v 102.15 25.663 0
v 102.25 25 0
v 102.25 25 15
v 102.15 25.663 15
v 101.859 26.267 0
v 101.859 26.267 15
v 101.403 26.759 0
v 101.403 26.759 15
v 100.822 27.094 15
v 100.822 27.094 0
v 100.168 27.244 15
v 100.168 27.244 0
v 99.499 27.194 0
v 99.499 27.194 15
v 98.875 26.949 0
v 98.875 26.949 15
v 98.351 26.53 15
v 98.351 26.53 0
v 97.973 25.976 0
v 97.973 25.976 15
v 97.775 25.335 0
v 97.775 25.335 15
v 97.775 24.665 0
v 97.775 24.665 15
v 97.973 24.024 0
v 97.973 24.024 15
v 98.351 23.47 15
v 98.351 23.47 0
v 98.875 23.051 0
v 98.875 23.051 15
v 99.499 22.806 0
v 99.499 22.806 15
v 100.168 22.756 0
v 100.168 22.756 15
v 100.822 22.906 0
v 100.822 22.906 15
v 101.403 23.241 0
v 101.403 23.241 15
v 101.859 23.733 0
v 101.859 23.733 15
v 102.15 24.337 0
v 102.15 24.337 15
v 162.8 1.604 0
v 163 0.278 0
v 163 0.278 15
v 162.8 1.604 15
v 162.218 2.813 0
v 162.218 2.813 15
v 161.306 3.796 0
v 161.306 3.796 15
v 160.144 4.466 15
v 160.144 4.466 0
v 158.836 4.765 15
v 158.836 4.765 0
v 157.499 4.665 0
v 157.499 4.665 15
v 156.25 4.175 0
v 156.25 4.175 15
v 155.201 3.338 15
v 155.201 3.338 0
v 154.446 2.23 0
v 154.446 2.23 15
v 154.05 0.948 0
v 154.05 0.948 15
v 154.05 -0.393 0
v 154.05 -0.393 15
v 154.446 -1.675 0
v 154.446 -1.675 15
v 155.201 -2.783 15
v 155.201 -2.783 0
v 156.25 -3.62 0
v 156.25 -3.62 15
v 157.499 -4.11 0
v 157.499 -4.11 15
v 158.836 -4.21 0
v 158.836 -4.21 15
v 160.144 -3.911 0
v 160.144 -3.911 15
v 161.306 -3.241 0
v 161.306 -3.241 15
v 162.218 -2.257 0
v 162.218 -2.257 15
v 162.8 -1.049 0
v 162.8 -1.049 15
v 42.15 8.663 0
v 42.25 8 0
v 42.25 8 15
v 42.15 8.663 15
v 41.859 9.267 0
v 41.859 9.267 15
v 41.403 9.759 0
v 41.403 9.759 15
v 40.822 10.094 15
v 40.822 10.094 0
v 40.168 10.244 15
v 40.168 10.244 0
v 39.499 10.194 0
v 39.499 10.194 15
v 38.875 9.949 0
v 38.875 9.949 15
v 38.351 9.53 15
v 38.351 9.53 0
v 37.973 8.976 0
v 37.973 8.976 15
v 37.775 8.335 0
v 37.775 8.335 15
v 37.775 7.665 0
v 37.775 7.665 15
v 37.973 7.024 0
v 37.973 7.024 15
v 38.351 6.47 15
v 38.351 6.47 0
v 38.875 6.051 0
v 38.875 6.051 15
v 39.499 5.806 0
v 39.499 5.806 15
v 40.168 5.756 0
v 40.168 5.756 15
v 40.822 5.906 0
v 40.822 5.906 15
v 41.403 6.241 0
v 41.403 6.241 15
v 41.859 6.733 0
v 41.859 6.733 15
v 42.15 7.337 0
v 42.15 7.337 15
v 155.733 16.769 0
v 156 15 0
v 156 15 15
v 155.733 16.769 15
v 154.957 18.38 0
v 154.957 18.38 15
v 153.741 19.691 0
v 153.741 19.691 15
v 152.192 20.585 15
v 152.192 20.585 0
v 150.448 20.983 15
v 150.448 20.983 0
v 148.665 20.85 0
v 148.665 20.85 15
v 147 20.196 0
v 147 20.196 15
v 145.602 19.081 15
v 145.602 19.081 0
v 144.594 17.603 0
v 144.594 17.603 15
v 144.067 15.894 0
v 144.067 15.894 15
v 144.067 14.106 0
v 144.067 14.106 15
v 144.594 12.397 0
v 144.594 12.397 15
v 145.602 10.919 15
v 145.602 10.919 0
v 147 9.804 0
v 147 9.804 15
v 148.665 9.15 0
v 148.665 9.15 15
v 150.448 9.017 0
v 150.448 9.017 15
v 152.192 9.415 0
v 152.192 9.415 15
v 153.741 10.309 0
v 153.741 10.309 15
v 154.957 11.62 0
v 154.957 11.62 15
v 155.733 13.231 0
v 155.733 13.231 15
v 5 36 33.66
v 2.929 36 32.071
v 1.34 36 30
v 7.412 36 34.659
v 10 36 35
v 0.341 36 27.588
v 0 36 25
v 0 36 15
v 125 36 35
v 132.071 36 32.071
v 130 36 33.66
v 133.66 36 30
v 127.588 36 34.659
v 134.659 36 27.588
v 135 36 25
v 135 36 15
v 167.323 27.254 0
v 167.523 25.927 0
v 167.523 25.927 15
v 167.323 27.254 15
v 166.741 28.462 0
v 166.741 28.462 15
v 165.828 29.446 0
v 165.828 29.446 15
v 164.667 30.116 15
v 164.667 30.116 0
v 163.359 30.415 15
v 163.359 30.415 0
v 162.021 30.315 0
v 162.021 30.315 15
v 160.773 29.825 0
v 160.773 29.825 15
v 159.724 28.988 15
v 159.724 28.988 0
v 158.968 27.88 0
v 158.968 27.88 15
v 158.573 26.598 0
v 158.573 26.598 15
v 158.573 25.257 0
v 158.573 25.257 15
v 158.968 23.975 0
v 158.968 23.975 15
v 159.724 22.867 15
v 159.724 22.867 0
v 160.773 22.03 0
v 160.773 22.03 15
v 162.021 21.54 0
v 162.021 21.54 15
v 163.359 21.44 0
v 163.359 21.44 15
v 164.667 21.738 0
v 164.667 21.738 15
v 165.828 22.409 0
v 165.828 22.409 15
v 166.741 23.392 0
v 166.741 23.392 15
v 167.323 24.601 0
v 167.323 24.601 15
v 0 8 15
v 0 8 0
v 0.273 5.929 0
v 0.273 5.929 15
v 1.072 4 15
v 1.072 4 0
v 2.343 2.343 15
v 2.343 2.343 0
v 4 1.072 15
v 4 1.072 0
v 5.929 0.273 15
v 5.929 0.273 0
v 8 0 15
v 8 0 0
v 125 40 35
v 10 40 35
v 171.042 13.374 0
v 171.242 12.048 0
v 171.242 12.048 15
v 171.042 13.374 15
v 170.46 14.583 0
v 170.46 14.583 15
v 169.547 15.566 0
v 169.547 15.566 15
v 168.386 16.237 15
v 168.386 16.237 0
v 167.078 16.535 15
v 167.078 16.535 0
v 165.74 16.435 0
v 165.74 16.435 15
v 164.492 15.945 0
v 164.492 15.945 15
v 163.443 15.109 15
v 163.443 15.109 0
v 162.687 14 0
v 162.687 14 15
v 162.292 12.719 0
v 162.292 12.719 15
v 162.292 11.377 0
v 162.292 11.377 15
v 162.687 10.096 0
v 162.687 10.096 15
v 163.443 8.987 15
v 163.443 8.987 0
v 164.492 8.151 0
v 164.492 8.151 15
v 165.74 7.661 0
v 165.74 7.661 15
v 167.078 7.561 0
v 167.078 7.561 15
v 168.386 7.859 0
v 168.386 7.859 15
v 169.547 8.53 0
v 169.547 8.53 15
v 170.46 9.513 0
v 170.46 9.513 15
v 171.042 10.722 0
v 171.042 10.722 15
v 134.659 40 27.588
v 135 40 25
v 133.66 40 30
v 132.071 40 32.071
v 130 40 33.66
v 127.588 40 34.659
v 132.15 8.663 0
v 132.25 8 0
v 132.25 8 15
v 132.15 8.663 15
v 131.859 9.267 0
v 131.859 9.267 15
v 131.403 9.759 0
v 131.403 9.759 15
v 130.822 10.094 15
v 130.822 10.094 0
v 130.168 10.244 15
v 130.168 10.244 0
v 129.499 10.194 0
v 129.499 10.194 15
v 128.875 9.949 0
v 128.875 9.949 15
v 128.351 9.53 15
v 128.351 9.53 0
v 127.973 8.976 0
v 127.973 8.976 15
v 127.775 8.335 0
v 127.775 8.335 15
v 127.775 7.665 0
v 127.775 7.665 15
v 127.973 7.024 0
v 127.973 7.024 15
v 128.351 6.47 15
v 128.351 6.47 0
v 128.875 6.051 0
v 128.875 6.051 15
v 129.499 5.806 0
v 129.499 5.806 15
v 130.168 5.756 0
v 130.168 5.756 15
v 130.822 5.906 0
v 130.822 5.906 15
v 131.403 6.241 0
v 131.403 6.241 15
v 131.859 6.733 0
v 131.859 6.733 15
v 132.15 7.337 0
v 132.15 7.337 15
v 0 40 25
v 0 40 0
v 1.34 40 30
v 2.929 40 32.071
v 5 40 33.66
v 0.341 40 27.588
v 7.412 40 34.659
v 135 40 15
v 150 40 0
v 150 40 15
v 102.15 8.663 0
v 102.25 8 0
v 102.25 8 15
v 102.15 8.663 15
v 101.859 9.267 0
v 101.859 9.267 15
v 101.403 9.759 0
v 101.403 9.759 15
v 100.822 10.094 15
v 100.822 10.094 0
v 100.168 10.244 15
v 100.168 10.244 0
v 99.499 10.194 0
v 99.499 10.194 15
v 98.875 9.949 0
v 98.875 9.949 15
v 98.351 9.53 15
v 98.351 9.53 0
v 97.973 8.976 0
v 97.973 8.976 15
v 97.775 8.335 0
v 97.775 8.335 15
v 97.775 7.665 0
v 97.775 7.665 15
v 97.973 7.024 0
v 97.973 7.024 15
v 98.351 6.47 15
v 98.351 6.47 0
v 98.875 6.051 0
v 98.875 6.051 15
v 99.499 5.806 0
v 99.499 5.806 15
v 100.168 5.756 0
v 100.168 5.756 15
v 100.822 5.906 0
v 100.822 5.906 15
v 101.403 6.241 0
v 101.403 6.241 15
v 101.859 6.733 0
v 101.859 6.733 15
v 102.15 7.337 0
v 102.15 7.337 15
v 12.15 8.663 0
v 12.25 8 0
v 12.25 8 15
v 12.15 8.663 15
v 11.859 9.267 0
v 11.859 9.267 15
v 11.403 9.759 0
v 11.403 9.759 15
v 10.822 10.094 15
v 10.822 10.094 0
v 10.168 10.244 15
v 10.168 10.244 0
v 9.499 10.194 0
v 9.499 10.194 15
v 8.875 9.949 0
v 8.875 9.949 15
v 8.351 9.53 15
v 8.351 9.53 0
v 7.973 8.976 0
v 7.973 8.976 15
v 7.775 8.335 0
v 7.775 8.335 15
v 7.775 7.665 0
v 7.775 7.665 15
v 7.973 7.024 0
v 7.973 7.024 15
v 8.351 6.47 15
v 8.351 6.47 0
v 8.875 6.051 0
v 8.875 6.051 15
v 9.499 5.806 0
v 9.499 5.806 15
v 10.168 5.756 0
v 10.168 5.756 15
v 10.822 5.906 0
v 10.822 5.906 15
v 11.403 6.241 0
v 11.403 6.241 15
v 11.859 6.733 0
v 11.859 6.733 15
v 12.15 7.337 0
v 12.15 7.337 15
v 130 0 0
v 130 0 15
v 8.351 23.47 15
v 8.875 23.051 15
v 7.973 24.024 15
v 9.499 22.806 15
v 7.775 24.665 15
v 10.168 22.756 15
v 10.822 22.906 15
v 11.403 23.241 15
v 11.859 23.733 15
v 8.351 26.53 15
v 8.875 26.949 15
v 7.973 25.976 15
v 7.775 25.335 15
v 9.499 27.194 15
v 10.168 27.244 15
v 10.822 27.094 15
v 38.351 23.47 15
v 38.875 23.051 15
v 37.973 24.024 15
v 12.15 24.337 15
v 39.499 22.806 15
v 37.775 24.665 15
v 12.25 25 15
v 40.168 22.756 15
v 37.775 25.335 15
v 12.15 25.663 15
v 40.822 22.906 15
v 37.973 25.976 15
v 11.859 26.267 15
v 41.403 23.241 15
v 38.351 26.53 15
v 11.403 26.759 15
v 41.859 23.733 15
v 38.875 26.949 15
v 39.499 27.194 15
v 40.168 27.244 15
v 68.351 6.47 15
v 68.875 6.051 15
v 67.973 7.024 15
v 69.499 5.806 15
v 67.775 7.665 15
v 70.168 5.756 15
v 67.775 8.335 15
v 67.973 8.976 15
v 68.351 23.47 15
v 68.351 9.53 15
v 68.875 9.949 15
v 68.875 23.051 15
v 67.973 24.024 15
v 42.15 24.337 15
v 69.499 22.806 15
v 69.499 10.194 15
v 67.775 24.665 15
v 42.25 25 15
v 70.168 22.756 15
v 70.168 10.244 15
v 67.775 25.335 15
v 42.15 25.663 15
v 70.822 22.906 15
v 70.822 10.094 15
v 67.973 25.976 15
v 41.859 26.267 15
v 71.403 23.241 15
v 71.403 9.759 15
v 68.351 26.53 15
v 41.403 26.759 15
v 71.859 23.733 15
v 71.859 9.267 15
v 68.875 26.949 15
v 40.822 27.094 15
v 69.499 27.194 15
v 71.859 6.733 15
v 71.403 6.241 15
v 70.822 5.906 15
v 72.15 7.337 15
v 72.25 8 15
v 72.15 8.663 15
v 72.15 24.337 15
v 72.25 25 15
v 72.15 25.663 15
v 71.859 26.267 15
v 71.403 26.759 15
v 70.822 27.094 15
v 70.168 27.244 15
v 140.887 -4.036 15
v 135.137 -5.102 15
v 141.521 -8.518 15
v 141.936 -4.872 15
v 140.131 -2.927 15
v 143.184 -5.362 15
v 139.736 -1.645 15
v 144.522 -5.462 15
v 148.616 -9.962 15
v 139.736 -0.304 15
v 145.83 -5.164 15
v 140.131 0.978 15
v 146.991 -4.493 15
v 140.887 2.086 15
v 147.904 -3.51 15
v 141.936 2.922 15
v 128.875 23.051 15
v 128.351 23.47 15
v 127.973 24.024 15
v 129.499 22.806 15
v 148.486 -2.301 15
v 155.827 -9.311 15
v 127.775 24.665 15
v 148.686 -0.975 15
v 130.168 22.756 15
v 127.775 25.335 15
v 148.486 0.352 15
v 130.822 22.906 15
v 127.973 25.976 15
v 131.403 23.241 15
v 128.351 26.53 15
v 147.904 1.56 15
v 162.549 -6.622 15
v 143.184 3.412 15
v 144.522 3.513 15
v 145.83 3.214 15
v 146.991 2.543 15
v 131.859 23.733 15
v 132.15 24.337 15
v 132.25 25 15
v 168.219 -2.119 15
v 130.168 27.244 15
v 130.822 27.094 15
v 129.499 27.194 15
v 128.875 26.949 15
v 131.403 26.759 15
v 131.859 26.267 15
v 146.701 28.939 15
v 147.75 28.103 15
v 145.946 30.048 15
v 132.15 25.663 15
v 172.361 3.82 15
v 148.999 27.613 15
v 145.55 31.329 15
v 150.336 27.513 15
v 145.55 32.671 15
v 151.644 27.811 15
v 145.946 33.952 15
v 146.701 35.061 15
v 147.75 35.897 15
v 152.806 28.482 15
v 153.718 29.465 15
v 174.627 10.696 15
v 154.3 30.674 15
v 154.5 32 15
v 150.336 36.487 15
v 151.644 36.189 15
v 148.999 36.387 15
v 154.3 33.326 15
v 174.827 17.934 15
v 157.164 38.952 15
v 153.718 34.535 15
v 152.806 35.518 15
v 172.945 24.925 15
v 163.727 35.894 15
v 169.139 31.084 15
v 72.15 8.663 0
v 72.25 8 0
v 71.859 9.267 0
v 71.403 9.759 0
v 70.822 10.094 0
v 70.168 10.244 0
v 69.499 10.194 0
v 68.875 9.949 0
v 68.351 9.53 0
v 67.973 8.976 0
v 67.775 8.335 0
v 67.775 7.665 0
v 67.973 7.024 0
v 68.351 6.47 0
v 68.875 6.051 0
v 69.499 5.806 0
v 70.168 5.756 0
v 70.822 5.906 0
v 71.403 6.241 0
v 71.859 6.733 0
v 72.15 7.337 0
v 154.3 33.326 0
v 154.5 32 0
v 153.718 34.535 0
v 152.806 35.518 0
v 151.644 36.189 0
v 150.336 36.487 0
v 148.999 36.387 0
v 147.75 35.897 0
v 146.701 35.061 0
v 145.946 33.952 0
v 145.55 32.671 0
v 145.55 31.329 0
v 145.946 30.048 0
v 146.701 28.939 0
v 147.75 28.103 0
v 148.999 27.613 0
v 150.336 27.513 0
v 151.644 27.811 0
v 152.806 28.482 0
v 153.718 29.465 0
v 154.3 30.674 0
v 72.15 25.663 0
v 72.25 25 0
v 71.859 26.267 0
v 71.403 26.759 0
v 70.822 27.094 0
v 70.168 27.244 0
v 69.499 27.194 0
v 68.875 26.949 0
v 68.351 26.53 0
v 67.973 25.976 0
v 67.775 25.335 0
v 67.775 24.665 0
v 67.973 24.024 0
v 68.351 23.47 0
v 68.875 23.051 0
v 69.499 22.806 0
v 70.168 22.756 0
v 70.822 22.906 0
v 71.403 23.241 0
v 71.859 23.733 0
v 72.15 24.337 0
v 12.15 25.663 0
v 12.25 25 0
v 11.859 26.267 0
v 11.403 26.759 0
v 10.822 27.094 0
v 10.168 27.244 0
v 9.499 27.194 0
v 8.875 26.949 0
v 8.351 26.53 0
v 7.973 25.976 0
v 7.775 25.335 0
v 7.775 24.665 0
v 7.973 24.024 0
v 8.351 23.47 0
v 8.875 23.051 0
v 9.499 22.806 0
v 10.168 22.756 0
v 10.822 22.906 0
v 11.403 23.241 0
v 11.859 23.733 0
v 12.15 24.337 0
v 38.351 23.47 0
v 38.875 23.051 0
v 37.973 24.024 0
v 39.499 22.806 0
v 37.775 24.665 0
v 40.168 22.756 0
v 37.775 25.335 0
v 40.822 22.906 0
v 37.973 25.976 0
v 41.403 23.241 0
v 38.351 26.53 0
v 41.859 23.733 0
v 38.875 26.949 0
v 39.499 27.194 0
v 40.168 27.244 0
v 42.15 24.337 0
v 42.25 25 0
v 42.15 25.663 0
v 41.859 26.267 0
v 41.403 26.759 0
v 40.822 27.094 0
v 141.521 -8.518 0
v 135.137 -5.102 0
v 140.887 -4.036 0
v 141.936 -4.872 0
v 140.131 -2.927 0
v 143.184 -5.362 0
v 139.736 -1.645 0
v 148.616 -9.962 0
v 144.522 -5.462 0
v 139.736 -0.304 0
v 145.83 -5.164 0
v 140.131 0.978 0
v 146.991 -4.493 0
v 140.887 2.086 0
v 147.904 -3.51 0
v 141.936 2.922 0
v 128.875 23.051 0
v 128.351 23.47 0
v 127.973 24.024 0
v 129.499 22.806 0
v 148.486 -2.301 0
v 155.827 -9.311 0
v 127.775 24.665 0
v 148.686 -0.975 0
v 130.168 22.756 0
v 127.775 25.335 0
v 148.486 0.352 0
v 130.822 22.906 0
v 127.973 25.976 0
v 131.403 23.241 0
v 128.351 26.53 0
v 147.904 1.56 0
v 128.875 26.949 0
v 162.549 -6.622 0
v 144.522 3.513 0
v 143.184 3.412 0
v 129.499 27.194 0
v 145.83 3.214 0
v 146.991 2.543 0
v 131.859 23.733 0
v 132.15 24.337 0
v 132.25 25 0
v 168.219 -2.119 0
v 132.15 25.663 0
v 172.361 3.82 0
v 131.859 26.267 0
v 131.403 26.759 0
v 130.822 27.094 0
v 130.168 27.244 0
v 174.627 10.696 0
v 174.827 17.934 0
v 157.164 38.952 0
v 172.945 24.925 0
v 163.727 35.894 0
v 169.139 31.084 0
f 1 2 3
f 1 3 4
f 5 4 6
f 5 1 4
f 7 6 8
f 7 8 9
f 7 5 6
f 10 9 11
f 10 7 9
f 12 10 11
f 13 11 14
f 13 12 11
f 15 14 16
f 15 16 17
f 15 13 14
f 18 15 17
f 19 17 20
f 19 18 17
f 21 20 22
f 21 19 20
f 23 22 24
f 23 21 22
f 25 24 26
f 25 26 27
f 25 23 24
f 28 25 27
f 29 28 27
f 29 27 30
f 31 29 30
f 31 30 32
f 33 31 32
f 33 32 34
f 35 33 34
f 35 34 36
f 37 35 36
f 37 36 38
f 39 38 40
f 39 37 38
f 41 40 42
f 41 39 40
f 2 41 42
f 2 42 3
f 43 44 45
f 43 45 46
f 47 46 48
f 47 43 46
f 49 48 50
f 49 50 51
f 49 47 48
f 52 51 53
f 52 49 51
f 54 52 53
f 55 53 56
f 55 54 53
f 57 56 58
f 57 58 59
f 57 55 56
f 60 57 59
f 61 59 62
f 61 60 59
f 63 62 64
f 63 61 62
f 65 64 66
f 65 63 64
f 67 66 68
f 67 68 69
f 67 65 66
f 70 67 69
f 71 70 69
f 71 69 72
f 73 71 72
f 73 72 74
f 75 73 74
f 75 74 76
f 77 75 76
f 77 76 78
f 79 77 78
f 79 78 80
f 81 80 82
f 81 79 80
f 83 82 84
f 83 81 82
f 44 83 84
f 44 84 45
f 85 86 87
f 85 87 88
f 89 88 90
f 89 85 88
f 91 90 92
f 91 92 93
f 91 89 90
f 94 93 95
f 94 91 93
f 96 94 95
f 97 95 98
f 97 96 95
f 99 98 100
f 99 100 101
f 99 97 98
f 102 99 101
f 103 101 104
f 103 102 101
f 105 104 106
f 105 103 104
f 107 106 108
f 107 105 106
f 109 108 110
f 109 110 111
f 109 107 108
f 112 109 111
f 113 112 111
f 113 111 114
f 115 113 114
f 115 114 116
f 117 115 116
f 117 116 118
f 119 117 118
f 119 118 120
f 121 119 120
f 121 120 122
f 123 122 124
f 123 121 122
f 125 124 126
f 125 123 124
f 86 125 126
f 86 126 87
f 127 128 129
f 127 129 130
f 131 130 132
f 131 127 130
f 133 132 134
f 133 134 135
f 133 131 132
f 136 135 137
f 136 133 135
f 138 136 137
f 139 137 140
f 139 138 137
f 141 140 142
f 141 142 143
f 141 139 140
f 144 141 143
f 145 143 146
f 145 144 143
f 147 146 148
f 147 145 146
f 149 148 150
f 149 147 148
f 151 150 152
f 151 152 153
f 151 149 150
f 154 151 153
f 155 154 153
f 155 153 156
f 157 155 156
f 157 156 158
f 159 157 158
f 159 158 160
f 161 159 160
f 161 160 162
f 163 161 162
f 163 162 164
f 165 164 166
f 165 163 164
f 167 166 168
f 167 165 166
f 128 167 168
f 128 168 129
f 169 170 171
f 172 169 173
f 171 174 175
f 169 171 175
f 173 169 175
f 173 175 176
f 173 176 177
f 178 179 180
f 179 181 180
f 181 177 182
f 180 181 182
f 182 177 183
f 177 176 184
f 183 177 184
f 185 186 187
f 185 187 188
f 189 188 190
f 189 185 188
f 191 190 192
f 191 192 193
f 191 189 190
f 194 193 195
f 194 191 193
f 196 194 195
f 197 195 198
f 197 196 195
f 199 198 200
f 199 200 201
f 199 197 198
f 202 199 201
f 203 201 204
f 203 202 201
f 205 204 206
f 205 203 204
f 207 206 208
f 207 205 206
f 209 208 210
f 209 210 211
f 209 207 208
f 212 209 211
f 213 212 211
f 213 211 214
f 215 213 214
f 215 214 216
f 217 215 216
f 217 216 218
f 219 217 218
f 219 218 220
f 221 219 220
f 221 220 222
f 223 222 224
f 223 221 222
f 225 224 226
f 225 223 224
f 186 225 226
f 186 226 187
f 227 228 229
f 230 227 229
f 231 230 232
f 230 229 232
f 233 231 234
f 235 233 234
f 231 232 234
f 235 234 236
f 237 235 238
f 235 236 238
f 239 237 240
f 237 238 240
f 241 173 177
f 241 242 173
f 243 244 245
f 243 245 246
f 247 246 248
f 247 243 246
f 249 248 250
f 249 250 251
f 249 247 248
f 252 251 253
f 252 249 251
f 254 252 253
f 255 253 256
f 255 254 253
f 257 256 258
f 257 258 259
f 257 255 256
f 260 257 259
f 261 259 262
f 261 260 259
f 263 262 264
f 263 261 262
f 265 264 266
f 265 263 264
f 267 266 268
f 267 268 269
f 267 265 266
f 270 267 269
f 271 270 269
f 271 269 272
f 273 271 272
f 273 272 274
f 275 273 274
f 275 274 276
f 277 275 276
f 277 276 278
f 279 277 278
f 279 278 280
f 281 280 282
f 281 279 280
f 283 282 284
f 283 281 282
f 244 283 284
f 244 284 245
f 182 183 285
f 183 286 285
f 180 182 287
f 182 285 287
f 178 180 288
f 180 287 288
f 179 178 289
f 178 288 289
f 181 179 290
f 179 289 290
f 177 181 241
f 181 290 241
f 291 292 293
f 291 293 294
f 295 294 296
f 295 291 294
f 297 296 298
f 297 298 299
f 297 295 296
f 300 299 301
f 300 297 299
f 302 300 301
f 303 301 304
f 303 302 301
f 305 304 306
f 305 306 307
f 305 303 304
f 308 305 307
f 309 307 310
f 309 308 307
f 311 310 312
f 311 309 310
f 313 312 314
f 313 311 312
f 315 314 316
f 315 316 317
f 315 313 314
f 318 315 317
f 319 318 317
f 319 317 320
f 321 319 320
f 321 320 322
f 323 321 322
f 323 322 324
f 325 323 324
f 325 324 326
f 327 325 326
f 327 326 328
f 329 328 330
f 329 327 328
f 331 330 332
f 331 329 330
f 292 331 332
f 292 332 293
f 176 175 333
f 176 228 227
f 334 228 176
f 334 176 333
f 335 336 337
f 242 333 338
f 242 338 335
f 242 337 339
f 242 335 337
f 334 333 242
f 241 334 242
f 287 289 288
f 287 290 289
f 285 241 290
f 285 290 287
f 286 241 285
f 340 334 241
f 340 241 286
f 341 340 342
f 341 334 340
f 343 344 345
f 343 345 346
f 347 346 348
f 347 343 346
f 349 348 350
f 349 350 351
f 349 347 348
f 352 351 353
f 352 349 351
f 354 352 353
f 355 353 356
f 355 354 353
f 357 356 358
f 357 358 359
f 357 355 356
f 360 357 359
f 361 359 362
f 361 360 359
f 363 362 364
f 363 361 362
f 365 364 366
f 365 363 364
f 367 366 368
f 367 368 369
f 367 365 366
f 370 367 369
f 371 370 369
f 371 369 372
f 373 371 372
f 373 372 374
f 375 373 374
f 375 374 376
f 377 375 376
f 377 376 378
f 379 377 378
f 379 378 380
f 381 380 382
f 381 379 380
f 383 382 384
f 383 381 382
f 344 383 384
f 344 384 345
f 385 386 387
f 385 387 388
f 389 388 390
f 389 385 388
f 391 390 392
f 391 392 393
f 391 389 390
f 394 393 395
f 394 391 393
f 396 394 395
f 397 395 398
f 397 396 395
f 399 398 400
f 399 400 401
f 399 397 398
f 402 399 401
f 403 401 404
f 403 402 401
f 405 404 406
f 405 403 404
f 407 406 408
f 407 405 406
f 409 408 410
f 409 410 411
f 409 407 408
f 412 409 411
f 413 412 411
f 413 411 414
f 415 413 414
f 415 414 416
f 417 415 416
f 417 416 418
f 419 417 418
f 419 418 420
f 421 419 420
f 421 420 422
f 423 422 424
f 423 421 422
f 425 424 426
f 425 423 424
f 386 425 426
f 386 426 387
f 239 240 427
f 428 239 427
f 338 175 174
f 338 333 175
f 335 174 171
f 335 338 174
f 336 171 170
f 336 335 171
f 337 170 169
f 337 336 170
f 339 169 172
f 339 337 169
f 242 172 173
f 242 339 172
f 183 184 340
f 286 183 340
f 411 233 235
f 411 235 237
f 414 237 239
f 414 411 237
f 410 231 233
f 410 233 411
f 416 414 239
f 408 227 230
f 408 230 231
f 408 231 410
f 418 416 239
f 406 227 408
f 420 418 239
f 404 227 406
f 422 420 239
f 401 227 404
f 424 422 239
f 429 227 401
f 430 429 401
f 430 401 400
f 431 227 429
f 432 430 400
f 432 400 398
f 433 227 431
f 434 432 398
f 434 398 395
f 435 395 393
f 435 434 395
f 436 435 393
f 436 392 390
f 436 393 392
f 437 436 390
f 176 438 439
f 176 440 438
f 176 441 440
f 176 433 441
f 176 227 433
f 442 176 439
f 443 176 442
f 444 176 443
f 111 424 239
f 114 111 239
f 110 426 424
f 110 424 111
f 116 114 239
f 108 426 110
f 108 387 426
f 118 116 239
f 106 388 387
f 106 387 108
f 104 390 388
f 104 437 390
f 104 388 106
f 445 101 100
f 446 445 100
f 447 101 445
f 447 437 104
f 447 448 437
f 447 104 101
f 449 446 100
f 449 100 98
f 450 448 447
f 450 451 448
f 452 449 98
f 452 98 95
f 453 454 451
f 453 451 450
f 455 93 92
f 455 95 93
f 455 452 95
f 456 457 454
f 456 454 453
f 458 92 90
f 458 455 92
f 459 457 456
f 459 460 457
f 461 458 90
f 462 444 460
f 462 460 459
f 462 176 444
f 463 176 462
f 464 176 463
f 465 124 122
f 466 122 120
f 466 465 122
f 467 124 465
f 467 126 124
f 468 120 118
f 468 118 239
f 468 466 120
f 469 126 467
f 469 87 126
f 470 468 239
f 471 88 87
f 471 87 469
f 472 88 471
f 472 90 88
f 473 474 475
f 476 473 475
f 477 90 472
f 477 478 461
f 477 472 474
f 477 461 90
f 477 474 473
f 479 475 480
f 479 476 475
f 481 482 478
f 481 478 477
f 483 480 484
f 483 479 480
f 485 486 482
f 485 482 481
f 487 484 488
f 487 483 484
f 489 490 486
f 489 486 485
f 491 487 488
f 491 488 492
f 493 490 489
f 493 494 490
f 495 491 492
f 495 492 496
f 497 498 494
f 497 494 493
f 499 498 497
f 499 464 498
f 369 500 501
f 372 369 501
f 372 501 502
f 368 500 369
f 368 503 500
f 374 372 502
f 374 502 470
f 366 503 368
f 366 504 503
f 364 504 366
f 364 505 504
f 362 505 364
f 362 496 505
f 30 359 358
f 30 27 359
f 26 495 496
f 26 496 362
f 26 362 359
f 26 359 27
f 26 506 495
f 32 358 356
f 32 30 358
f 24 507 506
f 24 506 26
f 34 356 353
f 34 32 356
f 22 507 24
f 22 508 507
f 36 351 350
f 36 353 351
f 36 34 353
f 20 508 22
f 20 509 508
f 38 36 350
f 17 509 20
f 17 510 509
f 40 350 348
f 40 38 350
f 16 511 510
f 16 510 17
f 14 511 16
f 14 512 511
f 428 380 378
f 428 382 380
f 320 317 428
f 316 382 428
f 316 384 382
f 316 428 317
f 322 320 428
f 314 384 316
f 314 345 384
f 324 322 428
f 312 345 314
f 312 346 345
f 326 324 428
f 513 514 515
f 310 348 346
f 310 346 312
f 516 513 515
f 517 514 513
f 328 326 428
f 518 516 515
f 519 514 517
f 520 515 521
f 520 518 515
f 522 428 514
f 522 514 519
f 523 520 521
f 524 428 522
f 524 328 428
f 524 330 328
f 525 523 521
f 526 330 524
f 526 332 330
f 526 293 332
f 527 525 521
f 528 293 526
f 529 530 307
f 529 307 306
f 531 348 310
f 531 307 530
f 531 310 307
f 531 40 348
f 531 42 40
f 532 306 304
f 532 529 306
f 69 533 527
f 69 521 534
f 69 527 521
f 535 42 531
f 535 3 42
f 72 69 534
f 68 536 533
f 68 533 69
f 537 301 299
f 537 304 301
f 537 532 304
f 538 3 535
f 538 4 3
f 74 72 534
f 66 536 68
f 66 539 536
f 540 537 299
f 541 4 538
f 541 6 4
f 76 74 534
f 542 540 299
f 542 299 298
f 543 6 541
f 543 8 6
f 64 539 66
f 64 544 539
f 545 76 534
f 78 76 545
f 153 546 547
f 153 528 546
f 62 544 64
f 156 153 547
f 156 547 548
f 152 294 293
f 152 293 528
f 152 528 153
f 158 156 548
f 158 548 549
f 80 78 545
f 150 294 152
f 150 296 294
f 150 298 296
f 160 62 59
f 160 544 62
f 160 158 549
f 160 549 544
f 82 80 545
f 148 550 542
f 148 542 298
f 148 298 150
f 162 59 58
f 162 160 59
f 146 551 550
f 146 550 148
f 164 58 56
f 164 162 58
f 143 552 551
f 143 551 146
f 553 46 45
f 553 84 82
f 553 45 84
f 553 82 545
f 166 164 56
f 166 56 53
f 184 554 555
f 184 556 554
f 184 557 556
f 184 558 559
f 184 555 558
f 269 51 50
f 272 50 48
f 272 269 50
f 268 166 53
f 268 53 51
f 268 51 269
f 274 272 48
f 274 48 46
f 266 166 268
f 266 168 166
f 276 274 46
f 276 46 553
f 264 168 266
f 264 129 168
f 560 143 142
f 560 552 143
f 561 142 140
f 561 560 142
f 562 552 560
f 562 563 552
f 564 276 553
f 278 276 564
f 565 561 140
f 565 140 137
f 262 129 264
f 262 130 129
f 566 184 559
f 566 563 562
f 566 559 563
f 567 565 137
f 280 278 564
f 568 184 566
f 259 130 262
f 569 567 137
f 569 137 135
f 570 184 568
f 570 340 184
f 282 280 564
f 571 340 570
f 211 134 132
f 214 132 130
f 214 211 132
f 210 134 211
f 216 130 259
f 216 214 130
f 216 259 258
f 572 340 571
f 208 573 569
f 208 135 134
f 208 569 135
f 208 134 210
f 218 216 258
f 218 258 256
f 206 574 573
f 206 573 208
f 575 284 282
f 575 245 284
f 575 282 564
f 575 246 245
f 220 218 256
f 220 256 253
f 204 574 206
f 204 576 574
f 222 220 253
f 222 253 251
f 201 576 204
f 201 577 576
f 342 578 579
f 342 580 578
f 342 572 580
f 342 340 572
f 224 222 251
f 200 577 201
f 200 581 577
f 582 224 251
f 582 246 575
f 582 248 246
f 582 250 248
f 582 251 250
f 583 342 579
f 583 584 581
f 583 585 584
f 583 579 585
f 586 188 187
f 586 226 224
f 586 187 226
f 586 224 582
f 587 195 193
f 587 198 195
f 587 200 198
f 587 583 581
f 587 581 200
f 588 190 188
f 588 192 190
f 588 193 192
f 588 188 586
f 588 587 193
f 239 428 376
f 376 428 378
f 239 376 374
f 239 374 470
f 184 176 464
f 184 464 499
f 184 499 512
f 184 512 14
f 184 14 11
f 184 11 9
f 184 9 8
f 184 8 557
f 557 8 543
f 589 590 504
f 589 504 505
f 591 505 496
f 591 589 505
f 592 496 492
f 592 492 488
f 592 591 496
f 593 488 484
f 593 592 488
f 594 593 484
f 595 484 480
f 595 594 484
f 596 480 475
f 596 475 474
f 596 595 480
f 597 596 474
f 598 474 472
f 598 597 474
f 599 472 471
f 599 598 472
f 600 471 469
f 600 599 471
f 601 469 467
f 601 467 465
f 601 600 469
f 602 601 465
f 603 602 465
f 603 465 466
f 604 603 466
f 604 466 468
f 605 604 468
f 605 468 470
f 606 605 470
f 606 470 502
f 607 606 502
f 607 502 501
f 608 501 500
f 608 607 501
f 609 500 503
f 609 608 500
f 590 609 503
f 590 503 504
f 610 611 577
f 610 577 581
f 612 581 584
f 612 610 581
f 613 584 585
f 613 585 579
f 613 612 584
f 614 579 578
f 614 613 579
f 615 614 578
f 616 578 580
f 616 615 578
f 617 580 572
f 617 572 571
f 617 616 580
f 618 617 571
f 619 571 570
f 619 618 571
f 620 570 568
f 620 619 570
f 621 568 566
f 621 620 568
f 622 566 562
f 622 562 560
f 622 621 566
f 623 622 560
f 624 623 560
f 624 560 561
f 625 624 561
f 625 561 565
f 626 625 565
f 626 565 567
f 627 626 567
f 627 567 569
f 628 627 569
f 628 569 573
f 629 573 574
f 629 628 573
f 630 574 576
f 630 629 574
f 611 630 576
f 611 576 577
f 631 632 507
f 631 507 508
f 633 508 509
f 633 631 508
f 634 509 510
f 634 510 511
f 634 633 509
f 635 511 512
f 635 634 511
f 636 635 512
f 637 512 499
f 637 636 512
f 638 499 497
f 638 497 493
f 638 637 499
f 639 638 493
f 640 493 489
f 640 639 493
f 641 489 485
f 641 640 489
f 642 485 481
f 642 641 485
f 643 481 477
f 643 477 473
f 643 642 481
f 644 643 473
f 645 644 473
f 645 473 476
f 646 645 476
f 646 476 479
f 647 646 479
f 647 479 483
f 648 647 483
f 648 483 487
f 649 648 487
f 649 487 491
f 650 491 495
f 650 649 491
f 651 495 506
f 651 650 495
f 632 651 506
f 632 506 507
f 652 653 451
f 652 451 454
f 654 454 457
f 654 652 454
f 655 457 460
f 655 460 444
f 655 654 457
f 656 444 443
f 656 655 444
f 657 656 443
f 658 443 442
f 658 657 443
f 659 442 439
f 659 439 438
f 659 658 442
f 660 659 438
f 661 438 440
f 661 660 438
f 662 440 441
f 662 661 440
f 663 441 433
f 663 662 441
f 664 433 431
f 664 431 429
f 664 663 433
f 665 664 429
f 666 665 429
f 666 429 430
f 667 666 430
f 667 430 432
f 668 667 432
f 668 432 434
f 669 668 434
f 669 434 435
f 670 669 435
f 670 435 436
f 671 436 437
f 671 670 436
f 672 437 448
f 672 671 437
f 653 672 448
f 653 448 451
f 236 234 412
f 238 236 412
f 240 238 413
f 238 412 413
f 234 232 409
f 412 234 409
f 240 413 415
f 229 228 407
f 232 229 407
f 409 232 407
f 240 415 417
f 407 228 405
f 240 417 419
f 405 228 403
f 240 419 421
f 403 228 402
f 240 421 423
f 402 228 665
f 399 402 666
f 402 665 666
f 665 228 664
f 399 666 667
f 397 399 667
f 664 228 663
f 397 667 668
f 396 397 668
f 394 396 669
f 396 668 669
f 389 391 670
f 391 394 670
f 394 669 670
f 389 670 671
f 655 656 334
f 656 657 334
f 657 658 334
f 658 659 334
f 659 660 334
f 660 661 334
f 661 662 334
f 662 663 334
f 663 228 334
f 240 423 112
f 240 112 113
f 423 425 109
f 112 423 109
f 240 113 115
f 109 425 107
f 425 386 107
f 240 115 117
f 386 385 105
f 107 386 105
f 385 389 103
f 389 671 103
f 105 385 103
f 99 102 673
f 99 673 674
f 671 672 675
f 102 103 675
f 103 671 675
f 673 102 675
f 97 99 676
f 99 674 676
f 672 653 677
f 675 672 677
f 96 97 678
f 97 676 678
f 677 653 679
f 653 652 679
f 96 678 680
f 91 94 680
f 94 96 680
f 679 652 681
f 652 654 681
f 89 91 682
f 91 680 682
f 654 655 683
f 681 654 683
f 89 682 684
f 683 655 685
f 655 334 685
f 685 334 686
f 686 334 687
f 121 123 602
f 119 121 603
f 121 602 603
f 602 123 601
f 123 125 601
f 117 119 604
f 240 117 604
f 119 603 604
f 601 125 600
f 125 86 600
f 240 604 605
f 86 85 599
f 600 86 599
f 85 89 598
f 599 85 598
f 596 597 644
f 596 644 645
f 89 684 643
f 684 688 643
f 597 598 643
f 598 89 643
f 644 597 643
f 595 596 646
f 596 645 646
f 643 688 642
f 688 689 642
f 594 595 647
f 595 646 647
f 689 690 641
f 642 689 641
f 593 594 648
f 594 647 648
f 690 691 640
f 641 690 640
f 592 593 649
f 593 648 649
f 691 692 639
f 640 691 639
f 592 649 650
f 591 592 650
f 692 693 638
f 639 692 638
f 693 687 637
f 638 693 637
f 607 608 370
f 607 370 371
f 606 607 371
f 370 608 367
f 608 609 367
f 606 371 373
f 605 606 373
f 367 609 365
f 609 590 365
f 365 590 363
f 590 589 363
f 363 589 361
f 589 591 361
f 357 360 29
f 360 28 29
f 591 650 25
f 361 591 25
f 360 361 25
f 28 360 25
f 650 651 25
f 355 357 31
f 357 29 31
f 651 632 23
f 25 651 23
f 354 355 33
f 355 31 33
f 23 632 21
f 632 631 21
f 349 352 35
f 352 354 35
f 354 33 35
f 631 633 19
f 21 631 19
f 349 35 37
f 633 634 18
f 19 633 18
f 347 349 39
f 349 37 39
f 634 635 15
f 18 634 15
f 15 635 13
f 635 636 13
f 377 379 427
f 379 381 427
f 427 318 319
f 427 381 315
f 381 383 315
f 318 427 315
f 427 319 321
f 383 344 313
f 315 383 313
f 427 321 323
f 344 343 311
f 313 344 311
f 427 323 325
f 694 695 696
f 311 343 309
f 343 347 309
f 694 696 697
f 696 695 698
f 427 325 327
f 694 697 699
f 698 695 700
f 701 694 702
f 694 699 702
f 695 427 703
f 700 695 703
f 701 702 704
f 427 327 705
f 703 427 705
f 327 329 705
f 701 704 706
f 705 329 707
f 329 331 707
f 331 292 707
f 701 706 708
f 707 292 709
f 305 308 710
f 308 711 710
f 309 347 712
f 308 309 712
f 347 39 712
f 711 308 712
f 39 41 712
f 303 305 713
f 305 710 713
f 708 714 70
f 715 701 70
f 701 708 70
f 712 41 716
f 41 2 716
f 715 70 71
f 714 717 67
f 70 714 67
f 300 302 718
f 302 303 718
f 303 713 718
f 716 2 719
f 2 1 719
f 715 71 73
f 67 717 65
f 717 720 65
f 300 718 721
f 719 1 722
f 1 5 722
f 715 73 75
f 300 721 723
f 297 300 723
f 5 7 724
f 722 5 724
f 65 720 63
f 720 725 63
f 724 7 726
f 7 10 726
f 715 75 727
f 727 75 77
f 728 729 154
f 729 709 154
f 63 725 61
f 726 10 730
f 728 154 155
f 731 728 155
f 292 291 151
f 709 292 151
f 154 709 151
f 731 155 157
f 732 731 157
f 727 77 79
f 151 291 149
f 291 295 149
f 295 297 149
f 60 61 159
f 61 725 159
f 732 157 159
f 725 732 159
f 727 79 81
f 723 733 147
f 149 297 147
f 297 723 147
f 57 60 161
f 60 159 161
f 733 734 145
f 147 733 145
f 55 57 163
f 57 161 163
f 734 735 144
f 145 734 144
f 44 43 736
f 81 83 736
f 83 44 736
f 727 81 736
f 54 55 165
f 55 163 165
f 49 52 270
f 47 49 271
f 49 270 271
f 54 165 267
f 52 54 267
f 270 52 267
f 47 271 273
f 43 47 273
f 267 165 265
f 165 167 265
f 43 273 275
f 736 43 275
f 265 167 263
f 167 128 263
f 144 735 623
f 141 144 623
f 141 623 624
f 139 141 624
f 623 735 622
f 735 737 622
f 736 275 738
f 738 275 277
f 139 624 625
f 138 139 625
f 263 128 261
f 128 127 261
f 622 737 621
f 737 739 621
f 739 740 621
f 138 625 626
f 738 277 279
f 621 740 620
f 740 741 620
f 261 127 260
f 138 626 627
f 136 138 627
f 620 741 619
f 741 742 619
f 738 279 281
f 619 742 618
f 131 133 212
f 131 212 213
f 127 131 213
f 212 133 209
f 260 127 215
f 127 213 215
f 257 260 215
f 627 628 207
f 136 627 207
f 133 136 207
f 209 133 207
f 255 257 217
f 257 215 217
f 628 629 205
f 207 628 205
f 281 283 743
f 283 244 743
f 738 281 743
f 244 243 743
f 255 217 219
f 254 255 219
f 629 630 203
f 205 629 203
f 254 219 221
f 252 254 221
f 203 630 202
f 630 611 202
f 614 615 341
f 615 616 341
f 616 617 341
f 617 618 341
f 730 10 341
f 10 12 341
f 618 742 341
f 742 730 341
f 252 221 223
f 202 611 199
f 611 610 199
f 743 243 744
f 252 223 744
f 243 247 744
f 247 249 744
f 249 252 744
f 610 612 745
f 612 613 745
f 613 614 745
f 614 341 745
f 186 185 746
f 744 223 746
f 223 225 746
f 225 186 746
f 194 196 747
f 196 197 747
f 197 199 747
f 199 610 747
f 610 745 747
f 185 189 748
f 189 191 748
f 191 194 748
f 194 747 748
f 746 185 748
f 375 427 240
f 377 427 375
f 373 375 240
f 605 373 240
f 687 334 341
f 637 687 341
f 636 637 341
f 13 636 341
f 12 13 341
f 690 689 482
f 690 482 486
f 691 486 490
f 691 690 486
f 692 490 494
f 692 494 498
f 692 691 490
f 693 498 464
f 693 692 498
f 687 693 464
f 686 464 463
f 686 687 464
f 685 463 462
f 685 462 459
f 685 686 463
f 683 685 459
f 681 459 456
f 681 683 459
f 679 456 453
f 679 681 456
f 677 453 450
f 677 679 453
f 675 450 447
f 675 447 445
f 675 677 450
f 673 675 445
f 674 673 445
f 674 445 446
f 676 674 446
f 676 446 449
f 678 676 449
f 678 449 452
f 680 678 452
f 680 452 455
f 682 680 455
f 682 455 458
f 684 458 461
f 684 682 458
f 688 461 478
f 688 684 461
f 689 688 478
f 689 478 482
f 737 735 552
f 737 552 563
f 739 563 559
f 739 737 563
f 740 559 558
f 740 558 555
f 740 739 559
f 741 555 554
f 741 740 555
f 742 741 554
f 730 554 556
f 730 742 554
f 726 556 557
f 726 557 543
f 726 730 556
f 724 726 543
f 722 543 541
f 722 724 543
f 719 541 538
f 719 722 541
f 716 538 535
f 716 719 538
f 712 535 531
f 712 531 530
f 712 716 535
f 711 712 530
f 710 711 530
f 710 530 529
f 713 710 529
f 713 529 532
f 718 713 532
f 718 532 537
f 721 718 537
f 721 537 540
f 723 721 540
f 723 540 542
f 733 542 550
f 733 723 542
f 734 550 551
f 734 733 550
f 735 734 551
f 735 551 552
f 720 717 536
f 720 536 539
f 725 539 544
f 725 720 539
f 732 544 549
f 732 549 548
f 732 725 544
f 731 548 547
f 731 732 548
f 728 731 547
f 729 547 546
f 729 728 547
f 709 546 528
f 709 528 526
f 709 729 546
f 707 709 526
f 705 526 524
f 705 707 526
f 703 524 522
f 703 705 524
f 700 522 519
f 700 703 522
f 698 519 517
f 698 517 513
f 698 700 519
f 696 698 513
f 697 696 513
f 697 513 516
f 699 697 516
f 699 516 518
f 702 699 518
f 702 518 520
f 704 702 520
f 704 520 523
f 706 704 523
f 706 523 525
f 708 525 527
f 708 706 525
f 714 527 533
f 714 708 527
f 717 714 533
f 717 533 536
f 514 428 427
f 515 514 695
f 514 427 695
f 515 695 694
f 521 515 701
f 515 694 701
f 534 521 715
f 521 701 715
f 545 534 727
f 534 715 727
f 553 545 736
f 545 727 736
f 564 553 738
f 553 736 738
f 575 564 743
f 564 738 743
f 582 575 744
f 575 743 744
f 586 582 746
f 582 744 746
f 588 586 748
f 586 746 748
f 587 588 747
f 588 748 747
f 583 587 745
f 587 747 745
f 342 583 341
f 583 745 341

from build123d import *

# Parameters (mm, degrees)
F0_R     = 2.25
F0_R_2   = 4.5
F0_R_3   = 6
F1_DEPTH = 15
F2_W     = 135
F2_H     = 4
F3_DEPTH = 20
F4_R     = 10


with BuildPart() as f1:
    # F0 (on Top) → F1 (new body)
    with BuildSketch(Plane.XY):
        with BuildLine():
            ThreePointArc((0, 8), (2.343146, 2.343146), (8, 0))
            Line((8, 0), (130, 0))
            ThreePointArc((130, 0), (172.36068, 3.81966), (150, 40))
            Line((150, 40), (0, 40))
            Line((0, 40), (0, 8))
        make_face()
        with Locations((10, 8)):
            Circle(F0_R, mode=Mode.SUBTRACT)
        with Locations((40, 8)):
            Circle(F0_R, mode=Mode.SUBTRACT)
        with Locations((70, 8)):
            Circle(F0_R, mode=Mode.SUBTRACT)
        with Locations((144.185658, -0.974775)):
            Circle(F0_R_2, mode=Mode.SUBTRACT)
        with Locations((158.5, 0.277568)):
            Circle(F0_R_2, mode=Mode.SUBTRACT)
        with Locations((100, 8)):
            Circle(F0_R, mode=Mode.SUBTRACT)
        with Locations((130, 8)):
            Circle(F0_R, mode=Mode.SUBTRACT)
        with Locations((166.741732, 12.047981)):
            Circle(F0_R_2, mode=Mode.SUBTRACT)
        with Locations((10, 25)):
            Circle(F0_R, mode=Mode.SUBTRACT)
        with Locations((40, 25)):
            Circle(F0_R, mode=Mode.SUBTRACT)
        with Locations((70, 25)):
            Circle(F0_R, mode=Mode.SUBTRACT)
        with Locations((100, 25)):
            Circle(F0_R, mode=Mode.SUBTRACT)
        with Locations((130, 25)):
            Circle(F0_R, mode=Mode.SUBTRACT)
        with Locations((150, 15)):
            Circle(F0_R_3, mode=Mode.SUBTRACT)
        with Locations((163.022756, 25.927389)):
            Circle(F0_R_2, mode=Mode.SUBTRACT)
        with Locations((150, 32)):
            Circle(F0_R_2, mode=Mode.SUBTRACT)
    extrude(amount=F1_DEPTH)

    # F2 (on face) → F3 (join)
    with BuildSketch(Plane.XY.offset(15)):
        with Locations((67.5, 38)):
            Rectangle(F2_W, F2_H)
    extrude(amount=F3_DEPTH)

    # F4
    f4_edges = [f1.edges().sort_by_distance(p)[0] for p in [
        (135, 38, 35),
        (0, 38, 35),
    ]]
    fillet(f4_edges, radius=F4_R)


solid = f1.part
